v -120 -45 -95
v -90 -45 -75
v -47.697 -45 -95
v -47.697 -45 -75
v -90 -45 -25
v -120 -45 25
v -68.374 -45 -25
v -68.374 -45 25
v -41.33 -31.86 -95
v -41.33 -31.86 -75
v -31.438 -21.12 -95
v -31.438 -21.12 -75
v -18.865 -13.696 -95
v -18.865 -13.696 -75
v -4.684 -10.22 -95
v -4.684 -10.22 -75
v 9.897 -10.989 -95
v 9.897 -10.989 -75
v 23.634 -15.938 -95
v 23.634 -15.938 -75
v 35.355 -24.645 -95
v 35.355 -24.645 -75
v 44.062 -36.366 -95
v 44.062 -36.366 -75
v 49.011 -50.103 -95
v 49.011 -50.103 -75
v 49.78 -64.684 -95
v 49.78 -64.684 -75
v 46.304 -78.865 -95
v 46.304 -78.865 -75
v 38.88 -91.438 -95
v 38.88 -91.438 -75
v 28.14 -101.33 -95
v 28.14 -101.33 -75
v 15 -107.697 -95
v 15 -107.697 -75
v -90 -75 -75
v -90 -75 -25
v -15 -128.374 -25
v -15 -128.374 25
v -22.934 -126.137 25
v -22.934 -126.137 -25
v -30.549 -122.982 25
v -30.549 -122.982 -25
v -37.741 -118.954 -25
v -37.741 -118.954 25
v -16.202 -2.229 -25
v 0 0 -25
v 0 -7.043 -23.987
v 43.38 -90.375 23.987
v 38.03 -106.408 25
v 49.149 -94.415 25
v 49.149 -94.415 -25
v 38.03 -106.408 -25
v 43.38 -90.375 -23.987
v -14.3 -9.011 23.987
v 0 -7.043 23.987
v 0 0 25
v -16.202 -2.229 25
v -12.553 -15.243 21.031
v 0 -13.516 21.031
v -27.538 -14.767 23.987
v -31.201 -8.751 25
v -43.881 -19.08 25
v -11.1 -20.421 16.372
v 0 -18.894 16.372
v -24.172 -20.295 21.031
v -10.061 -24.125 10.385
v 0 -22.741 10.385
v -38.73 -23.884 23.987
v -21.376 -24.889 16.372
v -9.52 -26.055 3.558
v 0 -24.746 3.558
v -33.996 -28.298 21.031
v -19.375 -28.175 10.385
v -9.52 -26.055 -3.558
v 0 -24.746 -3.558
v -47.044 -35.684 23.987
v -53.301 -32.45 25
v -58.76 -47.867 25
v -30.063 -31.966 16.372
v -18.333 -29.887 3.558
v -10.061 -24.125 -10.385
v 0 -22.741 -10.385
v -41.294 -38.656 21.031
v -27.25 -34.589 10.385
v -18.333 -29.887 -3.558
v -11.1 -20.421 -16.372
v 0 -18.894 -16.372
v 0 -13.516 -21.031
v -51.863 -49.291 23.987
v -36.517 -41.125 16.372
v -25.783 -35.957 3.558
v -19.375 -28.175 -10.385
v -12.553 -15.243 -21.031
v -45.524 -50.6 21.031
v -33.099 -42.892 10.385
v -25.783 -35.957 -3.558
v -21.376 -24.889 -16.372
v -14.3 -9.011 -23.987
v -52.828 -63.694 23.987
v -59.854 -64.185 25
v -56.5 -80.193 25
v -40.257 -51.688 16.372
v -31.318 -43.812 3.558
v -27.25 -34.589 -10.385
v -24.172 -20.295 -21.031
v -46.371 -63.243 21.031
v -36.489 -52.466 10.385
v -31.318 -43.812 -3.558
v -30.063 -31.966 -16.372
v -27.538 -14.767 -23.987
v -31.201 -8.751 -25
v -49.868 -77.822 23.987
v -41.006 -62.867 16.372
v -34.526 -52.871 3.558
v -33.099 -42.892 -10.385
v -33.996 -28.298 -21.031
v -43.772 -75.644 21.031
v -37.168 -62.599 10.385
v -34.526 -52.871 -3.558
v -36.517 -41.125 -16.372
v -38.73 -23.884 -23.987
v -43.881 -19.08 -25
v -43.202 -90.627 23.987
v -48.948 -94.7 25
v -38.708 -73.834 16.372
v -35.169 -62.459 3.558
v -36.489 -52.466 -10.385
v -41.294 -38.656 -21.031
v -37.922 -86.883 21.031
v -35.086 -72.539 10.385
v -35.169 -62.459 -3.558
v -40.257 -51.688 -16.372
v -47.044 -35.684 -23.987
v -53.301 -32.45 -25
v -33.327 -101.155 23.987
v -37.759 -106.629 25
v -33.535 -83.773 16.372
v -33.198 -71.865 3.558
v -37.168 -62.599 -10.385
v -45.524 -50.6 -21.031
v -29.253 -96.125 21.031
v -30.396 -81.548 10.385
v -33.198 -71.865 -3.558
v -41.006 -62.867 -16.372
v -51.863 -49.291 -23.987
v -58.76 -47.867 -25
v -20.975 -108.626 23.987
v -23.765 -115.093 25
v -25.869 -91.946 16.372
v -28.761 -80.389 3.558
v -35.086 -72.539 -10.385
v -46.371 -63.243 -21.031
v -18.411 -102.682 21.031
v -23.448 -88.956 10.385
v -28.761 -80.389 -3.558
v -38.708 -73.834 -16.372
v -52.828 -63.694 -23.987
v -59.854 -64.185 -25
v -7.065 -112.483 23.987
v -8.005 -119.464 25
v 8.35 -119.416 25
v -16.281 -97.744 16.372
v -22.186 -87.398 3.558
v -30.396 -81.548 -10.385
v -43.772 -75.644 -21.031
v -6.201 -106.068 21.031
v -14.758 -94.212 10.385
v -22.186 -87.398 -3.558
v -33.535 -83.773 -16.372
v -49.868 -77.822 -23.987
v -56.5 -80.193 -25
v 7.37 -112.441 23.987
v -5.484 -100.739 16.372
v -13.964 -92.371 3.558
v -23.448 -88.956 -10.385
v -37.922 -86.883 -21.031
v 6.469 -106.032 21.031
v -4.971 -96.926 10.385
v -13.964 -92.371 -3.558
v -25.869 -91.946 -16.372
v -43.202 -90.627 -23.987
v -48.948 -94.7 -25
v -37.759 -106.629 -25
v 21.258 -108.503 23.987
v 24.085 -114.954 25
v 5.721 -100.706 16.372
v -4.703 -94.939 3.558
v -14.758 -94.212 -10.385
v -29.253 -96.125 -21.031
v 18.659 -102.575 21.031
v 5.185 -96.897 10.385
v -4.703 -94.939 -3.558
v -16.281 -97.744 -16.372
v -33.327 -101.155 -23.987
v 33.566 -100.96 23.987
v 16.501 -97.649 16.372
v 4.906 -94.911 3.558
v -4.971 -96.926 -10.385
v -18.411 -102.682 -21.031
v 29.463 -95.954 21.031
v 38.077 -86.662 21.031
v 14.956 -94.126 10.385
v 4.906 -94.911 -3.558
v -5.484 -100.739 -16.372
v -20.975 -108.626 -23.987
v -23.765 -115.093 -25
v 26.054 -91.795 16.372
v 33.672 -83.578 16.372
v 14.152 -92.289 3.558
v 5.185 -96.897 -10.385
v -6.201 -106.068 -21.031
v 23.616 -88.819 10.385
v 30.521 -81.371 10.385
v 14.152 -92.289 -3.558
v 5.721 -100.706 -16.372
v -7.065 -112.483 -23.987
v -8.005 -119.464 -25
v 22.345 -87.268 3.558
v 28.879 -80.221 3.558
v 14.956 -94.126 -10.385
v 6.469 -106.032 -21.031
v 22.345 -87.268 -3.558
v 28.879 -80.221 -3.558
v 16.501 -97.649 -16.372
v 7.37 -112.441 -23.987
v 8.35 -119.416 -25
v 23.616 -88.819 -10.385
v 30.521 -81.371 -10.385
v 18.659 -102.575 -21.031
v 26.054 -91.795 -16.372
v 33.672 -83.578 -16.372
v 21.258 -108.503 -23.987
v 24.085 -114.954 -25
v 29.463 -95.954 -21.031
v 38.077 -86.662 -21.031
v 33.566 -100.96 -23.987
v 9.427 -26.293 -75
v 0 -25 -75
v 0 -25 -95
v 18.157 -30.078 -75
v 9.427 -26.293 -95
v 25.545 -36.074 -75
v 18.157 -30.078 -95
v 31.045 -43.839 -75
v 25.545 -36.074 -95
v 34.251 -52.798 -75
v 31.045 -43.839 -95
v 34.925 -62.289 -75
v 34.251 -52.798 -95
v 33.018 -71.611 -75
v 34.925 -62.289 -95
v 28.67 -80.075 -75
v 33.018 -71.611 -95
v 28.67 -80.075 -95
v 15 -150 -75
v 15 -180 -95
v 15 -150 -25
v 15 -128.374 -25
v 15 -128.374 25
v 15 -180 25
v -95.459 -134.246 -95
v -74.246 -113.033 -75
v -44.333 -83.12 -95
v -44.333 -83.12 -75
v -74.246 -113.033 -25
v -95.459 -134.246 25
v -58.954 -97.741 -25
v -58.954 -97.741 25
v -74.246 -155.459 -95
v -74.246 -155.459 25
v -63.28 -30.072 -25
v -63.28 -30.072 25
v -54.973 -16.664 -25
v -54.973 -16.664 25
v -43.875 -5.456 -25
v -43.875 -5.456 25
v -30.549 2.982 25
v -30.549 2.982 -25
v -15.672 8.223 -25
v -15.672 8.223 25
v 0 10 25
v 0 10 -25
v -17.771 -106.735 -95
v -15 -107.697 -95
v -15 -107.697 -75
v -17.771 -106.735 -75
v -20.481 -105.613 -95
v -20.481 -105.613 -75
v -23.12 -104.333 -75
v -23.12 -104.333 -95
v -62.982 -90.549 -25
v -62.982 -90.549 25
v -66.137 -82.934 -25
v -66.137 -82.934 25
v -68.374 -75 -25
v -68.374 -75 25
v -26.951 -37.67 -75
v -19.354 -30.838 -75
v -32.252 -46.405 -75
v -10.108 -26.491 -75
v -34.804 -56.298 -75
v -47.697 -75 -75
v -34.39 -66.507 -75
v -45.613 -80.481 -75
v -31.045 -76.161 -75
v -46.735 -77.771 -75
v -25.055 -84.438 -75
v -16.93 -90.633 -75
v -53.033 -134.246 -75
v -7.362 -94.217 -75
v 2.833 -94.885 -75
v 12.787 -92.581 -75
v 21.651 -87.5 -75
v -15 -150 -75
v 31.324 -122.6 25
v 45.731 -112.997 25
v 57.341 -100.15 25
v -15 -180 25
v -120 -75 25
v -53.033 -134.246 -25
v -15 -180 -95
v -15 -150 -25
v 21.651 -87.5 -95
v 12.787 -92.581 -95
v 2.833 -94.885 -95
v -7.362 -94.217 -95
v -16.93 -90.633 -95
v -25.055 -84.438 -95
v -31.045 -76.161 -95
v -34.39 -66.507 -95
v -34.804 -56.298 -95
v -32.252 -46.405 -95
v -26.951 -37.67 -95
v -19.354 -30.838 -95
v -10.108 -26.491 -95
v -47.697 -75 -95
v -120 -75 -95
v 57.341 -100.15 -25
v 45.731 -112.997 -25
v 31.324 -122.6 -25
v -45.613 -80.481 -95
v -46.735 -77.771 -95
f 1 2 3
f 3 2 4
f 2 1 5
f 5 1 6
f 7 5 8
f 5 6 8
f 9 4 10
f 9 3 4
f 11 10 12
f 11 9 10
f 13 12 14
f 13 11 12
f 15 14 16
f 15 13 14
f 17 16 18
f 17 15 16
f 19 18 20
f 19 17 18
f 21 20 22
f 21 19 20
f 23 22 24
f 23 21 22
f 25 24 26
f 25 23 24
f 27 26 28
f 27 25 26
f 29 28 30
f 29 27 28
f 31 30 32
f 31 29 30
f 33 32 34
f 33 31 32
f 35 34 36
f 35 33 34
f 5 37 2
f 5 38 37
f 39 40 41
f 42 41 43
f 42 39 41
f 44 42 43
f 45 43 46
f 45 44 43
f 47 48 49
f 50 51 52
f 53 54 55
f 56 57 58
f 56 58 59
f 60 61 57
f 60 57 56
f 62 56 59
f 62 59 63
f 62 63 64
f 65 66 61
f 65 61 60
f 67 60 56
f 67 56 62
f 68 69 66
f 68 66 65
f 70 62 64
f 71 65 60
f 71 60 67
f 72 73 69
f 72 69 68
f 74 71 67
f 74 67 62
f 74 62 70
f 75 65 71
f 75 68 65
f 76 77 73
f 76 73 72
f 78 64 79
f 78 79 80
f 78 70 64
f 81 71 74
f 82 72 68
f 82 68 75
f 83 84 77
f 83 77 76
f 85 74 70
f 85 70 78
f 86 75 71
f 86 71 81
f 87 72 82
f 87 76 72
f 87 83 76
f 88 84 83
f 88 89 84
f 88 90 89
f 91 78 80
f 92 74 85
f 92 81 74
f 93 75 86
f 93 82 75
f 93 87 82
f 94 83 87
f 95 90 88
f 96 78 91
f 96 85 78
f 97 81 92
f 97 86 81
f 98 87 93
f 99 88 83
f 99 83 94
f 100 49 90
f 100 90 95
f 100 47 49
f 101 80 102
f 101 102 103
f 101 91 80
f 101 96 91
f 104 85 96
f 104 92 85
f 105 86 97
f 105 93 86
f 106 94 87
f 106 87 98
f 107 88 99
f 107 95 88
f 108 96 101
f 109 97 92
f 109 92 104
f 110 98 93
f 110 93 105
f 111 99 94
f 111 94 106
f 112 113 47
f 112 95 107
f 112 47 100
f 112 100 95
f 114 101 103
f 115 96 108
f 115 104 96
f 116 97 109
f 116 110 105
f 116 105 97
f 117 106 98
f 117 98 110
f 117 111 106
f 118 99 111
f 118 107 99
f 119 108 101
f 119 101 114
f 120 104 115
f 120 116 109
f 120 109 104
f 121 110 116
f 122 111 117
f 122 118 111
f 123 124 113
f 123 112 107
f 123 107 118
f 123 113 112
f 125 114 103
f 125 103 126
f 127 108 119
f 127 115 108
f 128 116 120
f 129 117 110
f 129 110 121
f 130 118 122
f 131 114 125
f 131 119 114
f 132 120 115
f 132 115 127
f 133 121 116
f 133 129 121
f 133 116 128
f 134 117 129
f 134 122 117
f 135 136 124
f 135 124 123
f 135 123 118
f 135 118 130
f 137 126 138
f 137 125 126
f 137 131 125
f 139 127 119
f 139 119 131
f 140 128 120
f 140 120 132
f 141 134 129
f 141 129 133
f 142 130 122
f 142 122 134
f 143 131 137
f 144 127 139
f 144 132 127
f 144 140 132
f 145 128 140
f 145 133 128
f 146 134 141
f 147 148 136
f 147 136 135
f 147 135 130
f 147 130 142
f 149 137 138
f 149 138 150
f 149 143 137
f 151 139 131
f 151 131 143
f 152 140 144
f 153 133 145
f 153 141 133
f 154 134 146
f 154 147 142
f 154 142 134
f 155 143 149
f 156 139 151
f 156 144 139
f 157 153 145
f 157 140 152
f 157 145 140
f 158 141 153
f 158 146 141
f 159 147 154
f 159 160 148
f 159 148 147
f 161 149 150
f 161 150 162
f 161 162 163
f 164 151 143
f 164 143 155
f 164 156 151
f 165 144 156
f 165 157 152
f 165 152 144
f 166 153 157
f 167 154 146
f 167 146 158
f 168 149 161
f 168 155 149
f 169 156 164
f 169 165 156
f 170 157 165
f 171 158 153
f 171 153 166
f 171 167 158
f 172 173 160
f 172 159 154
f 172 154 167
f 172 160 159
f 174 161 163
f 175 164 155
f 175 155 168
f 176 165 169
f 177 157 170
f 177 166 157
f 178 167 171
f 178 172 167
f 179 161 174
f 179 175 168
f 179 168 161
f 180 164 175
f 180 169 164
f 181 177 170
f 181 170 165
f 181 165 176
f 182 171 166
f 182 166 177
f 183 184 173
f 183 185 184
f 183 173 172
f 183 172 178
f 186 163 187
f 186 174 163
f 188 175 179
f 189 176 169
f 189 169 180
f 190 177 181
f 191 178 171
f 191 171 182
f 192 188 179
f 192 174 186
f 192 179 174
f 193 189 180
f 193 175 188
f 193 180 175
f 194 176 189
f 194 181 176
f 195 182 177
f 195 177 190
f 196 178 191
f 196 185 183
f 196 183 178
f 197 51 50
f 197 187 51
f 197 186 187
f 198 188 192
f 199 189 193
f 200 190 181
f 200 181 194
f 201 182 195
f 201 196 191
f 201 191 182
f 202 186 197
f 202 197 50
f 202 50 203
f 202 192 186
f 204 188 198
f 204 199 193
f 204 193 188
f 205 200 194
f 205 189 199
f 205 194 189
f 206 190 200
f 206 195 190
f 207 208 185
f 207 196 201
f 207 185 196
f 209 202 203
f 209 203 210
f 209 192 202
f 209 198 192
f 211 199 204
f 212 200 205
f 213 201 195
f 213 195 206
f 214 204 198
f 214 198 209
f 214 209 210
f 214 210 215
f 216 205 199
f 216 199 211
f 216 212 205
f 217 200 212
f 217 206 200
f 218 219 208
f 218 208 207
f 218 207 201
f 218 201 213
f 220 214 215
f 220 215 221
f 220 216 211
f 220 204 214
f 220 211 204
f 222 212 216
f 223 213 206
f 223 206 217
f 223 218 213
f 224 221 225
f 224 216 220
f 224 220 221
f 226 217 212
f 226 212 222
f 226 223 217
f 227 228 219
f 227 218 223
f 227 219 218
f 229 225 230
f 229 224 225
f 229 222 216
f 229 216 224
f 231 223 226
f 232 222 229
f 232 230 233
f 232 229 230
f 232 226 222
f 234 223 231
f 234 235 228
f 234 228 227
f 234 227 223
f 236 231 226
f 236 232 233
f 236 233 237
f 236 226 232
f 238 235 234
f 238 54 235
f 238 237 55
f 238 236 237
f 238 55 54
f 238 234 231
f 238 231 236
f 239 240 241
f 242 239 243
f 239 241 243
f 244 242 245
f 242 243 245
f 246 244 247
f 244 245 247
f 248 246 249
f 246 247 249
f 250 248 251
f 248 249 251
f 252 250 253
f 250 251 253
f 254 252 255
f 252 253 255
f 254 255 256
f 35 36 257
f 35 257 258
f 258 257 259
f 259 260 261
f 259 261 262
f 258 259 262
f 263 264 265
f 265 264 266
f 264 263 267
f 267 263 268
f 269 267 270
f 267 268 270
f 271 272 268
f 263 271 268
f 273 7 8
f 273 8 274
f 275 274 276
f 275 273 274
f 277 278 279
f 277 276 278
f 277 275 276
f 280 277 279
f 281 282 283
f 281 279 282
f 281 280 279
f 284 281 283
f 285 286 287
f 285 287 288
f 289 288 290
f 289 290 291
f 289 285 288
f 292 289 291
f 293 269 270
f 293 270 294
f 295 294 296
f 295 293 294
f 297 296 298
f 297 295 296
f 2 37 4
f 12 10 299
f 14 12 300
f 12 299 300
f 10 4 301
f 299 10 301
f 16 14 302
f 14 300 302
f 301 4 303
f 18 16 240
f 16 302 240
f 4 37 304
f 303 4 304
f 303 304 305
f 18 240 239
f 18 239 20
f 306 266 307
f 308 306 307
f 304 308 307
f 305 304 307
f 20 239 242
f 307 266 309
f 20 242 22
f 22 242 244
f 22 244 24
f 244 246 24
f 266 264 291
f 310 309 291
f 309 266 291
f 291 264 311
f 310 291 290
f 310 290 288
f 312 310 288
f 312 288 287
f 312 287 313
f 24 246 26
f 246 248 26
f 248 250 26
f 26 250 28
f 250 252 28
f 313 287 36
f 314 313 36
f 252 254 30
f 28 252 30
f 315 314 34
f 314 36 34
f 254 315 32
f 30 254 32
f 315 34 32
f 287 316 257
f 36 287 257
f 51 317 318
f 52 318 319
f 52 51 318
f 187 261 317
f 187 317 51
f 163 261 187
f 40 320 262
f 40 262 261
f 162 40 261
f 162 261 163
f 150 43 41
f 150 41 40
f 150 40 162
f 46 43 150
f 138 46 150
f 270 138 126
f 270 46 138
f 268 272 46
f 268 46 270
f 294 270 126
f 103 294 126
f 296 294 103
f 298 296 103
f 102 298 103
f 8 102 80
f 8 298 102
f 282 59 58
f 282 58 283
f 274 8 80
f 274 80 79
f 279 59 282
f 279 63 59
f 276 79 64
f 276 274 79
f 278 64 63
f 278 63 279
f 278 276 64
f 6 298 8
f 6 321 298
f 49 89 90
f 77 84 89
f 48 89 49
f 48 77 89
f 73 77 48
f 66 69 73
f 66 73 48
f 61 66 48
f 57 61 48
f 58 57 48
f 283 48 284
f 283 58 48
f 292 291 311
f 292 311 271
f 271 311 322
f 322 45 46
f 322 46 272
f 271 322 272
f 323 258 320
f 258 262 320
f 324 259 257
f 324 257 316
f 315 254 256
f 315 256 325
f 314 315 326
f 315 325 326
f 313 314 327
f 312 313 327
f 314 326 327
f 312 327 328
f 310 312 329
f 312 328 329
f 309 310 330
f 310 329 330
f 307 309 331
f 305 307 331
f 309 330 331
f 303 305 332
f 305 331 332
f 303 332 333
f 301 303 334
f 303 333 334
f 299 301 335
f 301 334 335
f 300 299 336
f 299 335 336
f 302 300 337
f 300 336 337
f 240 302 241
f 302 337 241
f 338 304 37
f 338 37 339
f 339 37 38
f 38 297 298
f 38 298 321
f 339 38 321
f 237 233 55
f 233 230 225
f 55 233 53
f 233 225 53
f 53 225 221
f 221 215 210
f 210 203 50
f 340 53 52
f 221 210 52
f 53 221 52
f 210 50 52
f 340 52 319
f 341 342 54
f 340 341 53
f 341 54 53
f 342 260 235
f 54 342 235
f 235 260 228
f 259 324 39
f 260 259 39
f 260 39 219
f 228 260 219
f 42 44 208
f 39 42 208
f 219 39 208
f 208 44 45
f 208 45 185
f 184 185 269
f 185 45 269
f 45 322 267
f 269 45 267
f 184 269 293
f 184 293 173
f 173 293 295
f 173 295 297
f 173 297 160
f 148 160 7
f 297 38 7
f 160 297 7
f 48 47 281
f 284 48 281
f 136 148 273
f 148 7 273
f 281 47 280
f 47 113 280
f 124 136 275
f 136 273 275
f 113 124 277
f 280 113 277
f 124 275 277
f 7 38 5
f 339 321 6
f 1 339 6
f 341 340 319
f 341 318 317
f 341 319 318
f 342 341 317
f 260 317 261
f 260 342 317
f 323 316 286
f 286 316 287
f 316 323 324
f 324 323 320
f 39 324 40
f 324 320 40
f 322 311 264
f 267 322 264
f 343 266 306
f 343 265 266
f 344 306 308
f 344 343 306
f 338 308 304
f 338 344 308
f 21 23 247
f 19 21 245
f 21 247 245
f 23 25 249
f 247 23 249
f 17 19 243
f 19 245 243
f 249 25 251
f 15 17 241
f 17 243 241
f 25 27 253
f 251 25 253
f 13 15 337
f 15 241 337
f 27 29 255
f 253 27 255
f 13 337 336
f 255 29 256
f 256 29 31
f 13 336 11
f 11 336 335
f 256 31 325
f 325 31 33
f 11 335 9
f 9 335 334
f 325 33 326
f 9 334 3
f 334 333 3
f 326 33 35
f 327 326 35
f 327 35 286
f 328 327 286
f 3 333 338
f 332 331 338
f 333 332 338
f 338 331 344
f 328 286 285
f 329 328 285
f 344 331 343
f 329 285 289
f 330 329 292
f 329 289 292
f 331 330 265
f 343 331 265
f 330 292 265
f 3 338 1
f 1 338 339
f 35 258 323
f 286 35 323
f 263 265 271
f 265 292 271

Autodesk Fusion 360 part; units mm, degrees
sketch "Sketch1" plane through (0, 0, 0) normal (1, 0, 0) x (0, 1, 0)
  line L0 (0, 25) -> (10, 25)
  line L1 (10, 25) -> (10, -25)
  line L2 (10, -25) -> (0, -25)
  arc A0 (0, 25) -> (0, -25) centre (0, 0) ccw
  line L3 (-60, 25) -> (-60, -25)
  dimension "d1" = 50
  dimension "d2" = 10
  dimension "d3" = 50
  dimension "d4" = 60
revolve "Revolve1" add sketch "Sketch1" angle 235 about axis through (0, -60, 25) along (0, 0, 1) makes body 1
sketch "Sketch2" plane through (0, 0, 25) normal (0, 0, 1) x (-1, 0, 0)
  line L0 (0, 0) -> (0, -10)
  arc A0 (0, -10) -> (-57.3406, 100.1504) centre (0, 60) ccw
  line L1 (-57.3406, 100.1504) -> (-49.1491, 94.4146)
  arc A1 (0, 0) -> (-49.1491, 94.4146) centre (0, 60) ccw
  line L2 (62.0908, 75) -> (120, 75)
  line L3 (120, 75) -> (120, 45)
  line L4 (120, 45) -> (62.0908, 45)
  line L5 (62.0908, 45) -> (62.0908, 75)
  line L6 (120, 75) -> (90, 75)
  line L7 (90, 75) -> (90, 45)
  line L8 (90, 45) -> (120, 45)
  line L9 (120, 45) -> (120, 75)
  line L10 (74.2462, 155.4594) -> (95.4594, 134.2462)
  line L11 (54.5114, 93.2982) -> (33.2982, 114.5114)
  line L12 (33.2982, 114.5114) -> (74.2462, 155.4594)
  line L13 (95.4594, 134.2462) -> (54.5114, 93.2982)
  line L14 (53.033, 134.2462) -> (74.2462, 113.033)
  line L15 (-15, 180) -> (15, 180)
  line L16 (15, 122.0908) -> (-15, 122.0908)
  line L17 (-15, 122.0908) -> (-15, 180)
  line L18 (15, 180) -> (15, 122.0908)
  line L19 (-15, 150) -> (15, 150)
  dimension "d6" = 30
  dimension "d7" = 120
  dimension "d8" = 15
  dimension "d9" = 30
  dimension "d10" = 30
  dimension "d12" = 90
extrude "Extrude1" add sketch "Sketch2" against normal blind 120 separate body contours L2 L3 L4 L6 L7 L8 L9 | L15 L17 L18 L19 | L10 L12 L13 L14 makes body 2 at (5, -150, -15) makes body 3 at (-60.1041, -127.1751, -15) makes body 4 at (-90, -65, -15)
extrude "Extrude2" add sketch "Sketch2" against normal blind 50 contours A0 L2 L4 L7 | A0 L17 L18 L19 | A0 L12 L13 L14 bodies 1 2 3 4
sketch "Sketch3" plane through (0, 0, -95) normal (0, 0, -1) x (1, 0, 0)
  line L0 (-53.033, 134.2462) -> (-74.2462, 155.4594)
  line L1 (-74.2462, 155.4594) -> (-95.4594, 134.2462)
  line L2 (-95.4594, 134.2462) -> (-74.2462, 113.033)
  line L3 (-74.2462, 113.033) -> (-53.033, 134.2462)
  line L4 (-15, 180) -> (-15, 128.374)
  line L5 (15, 180) -> (-15, 180)
  line L6 (15, 128.374) -> (15, 180)
  arc A0 (-15, 128.374) -> (-37.7411, 118.9543) centre (0, 60) ccw
  line L7 (-95.4594, 134.2462) -> (-58.9543, 97.7411)
  line L8 (-74.2462, 155.4594) -> (-95.4594, 134.2462)
  line L9 (-37.7411, 118.9543) -> (-74.2462, 155.4594)
  arc A1 (-58.9543, 97.7411) -> (-68.374, 75) centre (0, 60) ccw
  line L10 (-120, 75) -> (-68.374, 75)
  line L11 (-68.374, 45) -> (-120, 45)
  line L12 (-120, 45) -> (-120, 75)
  arc A2 (-68.374, 45) -> (0, -10) centre (0, 60) ccw
  line L13 (0, 0) -> (0, 25)
  line L14 (28.6703, 80.0752) -> (49.1491, 94.4146)
  arc A3 (57.3406, 100.1504) -> (15, 128.374) centre (0, 60) ccw
  line L15 (0, 0) -> (0, -10)
  line L16 (49.1491, 94.4146) -> (57.3406, 100.1504)
  arc A4 (28.6703, 80.0752) -> (0, 25) centre (0, 60) ccw
  circle A5 centre (0, 60) radius 35
  circle A6 centre (0, 60) radius 50
  line L17 (-15, 128.374) -> (15, 128.374)
  line L18 (15, 128.374) -> (15, 100.874)
  line L19 (15, 100.874) -> (-15, 100.874)
  line L20 (-15, 100.874) -> (-15, 128.374)
  line L21 (-39.5089, 78.2957) -> (-58.9543, 97.7411)
  line L22 (-58.9543, 97.7411) -> (-37.7411, 118.9543)
  line L23 (-18.2957, 99.5089) -> (-39.5089, 78.2957)
  line L24 (-37.7411, 118.9543) -> (-18.2957, 99.5089)
  line L25 (-40.874, 45) -> (-68.374, 45)
  line L26 (-68.374, 45) -> (-68.374, 75)
  line L27 (-40.874, 75) -> (-40.874, 45)
  line L28 (-68.374, 75) -> (-40.874, 75)
  dimension "d17" = 70
  dimension "d18" = 100
  dimension "d19" = 30
  dimension "d20" = 27.5
  dimension "d22" = 90
extrude "Extrude3" add sketch "Sketch3" against normal blind 20 contours L3 L7 L9 L22 | A6 L21 L22 L24 | L4 L5 L6 L17 | A6 L17 L18 L20 | A6 L21 L23 L24 | L13 L14 A4 A5 A6 L18 L19 L20 L21 L23 L24 L25 L27 L28 | L10 L11 L12 L26 | A6 L25 L26 L28 | A6 L18 L19 L20 | A6 L25 L27 L28 | L13 L14 A5 A6 bodies 1
